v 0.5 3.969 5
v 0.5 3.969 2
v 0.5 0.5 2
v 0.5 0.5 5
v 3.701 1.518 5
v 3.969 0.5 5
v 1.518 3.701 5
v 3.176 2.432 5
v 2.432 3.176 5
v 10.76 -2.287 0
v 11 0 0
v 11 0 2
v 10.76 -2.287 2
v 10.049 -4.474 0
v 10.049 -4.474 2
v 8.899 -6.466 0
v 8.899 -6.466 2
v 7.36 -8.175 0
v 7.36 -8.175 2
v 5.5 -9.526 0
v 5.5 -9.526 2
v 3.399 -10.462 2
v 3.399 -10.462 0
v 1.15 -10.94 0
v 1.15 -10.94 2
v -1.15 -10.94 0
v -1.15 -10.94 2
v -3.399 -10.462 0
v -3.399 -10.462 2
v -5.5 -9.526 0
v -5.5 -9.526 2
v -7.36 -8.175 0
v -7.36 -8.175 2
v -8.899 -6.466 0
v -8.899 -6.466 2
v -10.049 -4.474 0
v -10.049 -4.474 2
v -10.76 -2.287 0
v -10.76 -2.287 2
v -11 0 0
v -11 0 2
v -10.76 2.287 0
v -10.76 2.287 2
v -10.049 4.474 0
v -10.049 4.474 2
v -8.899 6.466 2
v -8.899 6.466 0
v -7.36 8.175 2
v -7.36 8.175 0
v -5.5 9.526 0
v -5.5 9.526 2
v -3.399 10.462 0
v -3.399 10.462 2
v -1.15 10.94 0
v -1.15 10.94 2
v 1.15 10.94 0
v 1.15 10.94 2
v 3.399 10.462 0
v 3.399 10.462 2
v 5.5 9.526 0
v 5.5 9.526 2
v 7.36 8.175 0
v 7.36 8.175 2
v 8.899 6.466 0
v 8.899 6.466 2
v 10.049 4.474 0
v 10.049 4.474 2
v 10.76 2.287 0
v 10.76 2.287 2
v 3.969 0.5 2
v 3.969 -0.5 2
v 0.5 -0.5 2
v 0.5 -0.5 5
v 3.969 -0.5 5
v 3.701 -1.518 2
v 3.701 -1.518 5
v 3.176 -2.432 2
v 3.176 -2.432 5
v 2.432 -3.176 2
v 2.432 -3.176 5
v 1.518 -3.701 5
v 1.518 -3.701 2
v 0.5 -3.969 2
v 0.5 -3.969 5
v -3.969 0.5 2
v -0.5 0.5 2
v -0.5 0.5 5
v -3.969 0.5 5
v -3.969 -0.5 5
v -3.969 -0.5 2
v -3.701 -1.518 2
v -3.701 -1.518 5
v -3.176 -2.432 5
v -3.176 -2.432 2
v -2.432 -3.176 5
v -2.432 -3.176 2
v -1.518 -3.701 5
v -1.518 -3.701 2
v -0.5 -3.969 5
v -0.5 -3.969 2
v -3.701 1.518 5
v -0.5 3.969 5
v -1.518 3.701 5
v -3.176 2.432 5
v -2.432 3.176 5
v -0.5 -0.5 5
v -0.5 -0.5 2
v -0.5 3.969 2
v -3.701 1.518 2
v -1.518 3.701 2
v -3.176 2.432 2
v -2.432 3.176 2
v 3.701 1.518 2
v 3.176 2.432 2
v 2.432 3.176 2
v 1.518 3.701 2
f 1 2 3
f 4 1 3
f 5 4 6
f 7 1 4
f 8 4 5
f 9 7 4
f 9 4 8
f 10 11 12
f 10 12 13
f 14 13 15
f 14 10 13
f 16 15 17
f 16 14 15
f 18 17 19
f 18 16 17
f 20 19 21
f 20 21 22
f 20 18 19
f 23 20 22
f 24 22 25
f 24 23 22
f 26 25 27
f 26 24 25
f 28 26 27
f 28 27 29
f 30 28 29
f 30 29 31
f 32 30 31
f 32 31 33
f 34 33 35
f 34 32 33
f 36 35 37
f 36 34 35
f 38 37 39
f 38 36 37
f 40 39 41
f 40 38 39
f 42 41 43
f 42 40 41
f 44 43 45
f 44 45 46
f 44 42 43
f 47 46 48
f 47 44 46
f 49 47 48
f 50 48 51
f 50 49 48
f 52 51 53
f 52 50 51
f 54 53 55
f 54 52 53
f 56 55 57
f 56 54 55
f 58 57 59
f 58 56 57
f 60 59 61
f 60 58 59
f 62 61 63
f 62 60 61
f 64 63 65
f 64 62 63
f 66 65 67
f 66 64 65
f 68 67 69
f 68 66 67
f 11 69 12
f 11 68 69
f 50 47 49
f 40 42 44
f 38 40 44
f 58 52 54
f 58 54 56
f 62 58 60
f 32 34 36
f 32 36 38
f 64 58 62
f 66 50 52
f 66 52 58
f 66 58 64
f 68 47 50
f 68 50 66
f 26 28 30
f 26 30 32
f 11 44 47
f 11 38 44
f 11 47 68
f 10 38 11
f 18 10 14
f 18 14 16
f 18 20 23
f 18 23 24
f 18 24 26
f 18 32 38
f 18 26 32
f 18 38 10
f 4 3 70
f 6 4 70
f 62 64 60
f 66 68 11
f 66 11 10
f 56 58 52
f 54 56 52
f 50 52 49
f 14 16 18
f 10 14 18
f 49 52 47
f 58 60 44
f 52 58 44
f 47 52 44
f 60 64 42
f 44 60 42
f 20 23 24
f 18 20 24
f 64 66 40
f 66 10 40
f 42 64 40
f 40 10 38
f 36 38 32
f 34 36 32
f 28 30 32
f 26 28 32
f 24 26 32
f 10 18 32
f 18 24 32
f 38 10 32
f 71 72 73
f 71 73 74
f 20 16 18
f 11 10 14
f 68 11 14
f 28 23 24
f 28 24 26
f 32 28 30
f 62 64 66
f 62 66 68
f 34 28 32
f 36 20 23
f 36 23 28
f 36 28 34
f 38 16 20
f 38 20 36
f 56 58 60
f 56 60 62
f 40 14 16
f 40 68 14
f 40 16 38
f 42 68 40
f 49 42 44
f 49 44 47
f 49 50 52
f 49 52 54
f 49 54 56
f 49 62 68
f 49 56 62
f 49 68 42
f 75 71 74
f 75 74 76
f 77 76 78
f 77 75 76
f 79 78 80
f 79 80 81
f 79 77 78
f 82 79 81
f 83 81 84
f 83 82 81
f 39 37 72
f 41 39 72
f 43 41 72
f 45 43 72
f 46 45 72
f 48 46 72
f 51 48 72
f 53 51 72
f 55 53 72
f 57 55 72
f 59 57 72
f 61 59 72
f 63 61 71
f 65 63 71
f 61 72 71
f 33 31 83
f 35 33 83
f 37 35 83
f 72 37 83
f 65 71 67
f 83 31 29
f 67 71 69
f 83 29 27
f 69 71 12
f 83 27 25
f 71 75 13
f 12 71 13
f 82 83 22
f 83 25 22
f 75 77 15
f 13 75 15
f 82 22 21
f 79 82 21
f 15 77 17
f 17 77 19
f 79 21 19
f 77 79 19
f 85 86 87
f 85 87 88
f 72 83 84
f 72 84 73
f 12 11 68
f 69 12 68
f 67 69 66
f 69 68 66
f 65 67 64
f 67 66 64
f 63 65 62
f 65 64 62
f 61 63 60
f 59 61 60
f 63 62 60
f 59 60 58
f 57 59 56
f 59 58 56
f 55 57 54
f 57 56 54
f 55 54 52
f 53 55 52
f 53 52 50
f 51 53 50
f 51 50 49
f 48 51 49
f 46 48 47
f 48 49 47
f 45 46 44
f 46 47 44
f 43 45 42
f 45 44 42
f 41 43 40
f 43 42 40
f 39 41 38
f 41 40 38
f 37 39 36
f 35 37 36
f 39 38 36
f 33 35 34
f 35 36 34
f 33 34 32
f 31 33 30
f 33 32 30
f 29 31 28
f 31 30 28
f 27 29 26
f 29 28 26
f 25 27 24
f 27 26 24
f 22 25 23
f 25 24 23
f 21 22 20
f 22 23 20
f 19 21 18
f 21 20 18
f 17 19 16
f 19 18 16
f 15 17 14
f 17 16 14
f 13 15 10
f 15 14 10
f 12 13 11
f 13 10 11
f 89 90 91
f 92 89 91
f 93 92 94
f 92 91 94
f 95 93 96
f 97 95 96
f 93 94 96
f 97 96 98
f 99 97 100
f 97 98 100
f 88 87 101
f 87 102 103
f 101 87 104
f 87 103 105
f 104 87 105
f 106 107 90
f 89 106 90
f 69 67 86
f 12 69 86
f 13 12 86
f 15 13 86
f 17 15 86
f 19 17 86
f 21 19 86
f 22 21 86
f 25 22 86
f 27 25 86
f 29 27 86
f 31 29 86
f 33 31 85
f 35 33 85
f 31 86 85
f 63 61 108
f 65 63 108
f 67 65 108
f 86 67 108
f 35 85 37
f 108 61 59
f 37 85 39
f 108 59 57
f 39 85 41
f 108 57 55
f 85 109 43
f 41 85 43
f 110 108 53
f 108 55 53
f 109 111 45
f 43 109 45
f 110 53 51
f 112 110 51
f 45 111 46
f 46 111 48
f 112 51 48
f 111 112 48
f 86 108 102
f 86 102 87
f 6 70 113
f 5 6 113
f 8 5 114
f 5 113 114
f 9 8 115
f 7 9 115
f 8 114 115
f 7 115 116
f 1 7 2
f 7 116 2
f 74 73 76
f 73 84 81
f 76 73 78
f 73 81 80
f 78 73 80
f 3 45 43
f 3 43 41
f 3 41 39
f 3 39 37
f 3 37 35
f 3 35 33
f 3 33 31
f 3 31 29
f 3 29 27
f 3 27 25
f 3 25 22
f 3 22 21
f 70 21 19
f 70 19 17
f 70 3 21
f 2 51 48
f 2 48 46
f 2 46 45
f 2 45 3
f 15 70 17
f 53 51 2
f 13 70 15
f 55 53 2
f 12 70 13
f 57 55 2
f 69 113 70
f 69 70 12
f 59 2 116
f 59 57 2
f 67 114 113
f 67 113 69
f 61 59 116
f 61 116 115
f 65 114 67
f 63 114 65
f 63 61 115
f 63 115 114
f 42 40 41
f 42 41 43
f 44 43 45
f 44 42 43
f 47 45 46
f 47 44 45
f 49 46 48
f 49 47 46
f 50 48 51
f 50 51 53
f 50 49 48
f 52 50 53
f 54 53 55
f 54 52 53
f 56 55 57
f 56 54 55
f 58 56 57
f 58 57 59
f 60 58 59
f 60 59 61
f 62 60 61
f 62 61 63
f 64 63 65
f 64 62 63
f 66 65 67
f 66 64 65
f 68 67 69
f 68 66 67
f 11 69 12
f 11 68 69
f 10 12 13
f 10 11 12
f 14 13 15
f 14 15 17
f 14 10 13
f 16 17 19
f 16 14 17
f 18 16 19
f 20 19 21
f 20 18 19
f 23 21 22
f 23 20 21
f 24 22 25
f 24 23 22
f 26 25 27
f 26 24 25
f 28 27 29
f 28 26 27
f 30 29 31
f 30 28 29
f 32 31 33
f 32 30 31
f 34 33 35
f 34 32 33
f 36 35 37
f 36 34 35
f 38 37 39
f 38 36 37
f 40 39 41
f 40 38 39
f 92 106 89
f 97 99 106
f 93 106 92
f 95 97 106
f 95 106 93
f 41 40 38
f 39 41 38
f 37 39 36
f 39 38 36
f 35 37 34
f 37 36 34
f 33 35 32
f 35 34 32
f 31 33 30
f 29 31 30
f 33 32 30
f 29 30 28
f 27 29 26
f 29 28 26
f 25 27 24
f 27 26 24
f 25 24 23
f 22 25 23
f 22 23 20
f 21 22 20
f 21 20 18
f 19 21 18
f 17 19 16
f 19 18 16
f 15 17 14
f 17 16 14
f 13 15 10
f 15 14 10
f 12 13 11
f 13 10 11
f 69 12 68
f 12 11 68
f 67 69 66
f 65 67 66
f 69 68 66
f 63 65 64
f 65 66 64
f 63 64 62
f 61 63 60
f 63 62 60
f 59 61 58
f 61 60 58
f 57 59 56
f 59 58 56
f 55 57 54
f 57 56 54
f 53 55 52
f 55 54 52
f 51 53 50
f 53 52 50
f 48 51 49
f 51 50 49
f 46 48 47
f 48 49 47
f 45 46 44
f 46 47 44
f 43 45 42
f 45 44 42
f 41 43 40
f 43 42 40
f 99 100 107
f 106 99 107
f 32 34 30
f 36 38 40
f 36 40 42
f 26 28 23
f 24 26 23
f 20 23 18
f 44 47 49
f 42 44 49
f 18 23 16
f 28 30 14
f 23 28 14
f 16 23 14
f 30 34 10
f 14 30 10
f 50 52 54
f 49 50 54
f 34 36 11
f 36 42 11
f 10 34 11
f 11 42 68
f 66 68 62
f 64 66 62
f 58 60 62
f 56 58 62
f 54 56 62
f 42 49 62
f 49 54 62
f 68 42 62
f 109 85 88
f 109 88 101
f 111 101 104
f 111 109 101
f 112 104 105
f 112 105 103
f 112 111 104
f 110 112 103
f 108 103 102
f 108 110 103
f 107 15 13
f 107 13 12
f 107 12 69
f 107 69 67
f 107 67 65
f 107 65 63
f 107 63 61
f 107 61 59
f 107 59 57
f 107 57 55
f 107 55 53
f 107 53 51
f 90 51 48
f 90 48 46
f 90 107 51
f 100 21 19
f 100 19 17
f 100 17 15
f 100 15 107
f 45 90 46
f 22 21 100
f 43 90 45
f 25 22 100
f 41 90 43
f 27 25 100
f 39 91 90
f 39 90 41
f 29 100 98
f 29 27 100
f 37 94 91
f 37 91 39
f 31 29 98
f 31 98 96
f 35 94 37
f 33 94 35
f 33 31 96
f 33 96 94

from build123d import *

# Parameters (mm, degrees)
F0_R     = 11
F1_DEPTH = 2
F3_DEPTH = 3


with BuildPart() as f1:
    # F0 (on Top) → F1 (new body)
    with BuildSketch(Plane.XY):
        Circle(F0_R)
    extrude(amount=F1_DEPTH)

    # F2 (on face) → F3 (join)
    with BuildSketch(Plane.XY.offset(2)):
        with BuildLine():
            Line((0.5, 0.5), (3.968627, 0.5))
            ThreePointArc((3.968627, 0.5), (2.828427, 2.828427), (0.5, 3.968627))
            Line((0.5, 3.968627), (0.5, 0.5))
        make_face()
    extrude(amount=F3_DEPTH)


with BuildPart() as f4_1:
    # F4: instance of F1
    add(f1.part.mirror(Plane.XZ))


with BuildPart() as f5_1:
    # F5: instance of F1
    add(f1.part.mirror(Plane.YZ))


with BuildPart() as f5_2:
    # F5: instance of F4_1
    add(f4_1.part.mirror(Plane.YZ))


solid = Compound([f1.part, f4_1.part, f5_1.part, f5_2.part])
